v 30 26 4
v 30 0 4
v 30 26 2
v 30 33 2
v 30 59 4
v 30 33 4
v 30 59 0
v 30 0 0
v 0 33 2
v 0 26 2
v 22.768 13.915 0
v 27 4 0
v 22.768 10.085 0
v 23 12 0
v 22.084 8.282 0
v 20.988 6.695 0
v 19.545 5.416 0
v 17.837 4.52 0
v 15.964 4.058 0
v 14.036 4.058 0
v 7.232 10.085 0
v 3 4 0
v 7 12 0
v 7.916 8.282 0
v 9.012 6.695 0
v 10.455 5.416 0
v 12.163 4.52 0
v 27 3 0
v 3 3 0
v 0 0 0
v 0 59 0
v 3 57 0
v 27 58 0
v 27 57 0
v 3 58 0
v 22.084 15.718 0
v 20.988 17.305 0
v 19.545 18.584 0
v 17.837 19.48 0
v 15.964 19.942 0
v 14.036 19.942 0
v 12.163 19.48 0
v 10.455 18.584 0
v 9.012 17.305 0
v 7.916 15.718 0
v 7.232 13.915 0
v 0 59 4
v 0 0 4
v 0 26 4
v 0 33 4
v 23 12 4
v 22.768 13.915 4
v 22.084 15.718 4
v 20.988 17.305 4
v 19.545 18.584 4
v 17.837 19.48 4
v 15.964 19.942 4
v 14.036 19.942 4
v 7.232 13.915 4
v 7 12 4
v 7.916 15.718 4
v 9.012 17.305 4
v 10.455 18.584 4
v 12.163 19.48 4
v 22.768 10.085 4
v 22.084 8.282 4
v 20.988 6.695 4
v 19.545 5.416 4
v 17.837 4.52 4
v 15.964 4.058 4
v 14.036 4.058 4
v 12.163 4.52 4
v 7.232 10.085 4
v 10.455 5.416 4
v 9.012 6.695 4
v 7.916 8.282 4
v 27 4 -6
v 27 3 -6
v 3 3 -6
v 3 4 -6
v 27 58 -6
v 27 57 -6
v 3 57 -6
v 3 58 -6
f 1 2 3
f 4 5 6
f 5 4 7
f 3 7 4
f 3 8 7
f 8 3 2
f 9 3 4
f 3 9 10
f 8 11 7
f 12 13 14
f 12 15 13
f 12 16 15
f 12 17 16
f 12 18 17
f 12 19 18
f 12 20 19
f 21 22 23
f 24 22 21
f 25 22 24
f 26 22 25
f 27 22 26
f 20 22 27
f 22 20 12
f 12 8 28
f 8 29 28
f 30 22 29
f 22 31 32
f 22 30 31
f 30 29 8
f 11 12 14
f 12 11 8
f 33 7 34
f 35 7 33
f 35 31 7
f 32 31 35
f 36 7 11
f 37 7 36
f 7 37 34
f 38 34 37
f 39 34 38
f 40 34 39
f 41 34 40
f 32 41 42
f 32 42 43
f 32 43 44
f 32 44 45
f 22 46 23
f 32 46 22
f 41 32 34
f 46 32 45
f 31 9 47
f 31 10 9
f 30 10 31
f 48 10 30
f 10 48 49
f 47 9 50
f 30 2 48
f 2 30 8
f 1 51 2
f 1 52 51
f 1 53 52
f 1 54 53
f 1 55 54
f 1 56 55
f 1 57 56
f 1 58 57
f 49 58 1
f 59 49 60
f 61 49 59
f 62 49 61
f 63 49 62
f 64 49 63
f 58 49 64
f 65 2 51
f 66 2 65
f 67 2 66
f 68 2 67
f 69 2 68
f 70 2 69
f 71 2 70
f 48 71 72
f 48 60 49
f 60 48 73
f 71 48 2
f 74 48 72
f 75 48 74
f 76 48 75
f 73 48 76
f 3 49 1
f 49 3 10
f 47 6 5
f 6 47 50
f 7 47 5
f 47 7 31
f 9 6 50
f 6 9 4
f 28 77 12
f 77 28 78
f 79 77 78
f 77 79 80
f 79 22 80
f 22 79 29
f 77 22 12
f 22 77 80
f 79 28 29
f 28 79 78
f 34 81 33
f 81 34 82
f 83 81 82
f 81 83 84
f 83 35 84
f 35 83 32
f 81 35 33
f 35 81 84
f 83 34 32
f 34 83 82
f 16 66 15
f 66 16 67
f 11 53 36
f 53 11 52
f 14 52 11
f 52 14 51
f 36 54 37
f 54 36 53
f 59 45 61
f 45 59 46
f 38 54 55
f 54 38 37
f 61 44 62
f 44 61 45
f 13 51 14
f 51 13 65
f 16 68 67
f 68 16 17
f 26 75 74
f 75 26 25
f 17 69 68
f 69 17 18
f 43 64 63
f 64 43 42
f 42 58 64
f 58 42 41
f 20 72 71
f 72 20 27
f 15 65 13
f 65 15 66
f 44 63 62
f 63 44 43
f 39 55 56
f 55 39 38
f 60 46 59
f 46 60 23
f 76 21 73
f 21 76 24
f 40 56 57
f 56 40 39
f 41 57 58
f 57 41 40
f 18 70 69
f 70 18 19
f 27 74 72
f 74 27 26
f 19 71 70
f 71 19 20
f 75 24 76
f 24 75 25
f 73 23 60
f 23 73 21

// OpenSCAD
// Bottom
if (false)
difference(){
  cube([30, 58, 19]);
  translate([2, 2, -1])
    cube([26, 54, 18]);
  // USB hole
  for (i=[0:5]){
    translate([11-i/2, -1, 15-i])    
      cube([8+i, 40, 1]);
  }
  // Battery hole
  translate([20, 10, 8]){
      cube([15, 10, 7]);
  }  
  // APA102 hole
  translate([7, 56, 7]){
      cube([17, 20, 7]);
  }
}


if (false)
difference(){  
  union(){
    cube([30, 58, 2]);
    translate([15, 0, 0])
    cube([15, 29, 24]);
  }
  translate([12, 2, -1])
    cube([17, 25, 23]);
}

// For button feather wing
if (true)
difference(){  
  union(){
    cube([30, 58, 2]);
    cube([30, 26, 4]);
    translate([0,58-(20+5),0])
      cube([30, 26, 4]);
    // Left wing
    translate([3, 3, -6])
      cube([24, 1, 7]);
    // Right wing
    translate([3, 57, -6])
      cube([24, 1, 7]);
  }
  translate([15, 12, -1])
    cylinder(r1=8, r2=8, 8);
}
